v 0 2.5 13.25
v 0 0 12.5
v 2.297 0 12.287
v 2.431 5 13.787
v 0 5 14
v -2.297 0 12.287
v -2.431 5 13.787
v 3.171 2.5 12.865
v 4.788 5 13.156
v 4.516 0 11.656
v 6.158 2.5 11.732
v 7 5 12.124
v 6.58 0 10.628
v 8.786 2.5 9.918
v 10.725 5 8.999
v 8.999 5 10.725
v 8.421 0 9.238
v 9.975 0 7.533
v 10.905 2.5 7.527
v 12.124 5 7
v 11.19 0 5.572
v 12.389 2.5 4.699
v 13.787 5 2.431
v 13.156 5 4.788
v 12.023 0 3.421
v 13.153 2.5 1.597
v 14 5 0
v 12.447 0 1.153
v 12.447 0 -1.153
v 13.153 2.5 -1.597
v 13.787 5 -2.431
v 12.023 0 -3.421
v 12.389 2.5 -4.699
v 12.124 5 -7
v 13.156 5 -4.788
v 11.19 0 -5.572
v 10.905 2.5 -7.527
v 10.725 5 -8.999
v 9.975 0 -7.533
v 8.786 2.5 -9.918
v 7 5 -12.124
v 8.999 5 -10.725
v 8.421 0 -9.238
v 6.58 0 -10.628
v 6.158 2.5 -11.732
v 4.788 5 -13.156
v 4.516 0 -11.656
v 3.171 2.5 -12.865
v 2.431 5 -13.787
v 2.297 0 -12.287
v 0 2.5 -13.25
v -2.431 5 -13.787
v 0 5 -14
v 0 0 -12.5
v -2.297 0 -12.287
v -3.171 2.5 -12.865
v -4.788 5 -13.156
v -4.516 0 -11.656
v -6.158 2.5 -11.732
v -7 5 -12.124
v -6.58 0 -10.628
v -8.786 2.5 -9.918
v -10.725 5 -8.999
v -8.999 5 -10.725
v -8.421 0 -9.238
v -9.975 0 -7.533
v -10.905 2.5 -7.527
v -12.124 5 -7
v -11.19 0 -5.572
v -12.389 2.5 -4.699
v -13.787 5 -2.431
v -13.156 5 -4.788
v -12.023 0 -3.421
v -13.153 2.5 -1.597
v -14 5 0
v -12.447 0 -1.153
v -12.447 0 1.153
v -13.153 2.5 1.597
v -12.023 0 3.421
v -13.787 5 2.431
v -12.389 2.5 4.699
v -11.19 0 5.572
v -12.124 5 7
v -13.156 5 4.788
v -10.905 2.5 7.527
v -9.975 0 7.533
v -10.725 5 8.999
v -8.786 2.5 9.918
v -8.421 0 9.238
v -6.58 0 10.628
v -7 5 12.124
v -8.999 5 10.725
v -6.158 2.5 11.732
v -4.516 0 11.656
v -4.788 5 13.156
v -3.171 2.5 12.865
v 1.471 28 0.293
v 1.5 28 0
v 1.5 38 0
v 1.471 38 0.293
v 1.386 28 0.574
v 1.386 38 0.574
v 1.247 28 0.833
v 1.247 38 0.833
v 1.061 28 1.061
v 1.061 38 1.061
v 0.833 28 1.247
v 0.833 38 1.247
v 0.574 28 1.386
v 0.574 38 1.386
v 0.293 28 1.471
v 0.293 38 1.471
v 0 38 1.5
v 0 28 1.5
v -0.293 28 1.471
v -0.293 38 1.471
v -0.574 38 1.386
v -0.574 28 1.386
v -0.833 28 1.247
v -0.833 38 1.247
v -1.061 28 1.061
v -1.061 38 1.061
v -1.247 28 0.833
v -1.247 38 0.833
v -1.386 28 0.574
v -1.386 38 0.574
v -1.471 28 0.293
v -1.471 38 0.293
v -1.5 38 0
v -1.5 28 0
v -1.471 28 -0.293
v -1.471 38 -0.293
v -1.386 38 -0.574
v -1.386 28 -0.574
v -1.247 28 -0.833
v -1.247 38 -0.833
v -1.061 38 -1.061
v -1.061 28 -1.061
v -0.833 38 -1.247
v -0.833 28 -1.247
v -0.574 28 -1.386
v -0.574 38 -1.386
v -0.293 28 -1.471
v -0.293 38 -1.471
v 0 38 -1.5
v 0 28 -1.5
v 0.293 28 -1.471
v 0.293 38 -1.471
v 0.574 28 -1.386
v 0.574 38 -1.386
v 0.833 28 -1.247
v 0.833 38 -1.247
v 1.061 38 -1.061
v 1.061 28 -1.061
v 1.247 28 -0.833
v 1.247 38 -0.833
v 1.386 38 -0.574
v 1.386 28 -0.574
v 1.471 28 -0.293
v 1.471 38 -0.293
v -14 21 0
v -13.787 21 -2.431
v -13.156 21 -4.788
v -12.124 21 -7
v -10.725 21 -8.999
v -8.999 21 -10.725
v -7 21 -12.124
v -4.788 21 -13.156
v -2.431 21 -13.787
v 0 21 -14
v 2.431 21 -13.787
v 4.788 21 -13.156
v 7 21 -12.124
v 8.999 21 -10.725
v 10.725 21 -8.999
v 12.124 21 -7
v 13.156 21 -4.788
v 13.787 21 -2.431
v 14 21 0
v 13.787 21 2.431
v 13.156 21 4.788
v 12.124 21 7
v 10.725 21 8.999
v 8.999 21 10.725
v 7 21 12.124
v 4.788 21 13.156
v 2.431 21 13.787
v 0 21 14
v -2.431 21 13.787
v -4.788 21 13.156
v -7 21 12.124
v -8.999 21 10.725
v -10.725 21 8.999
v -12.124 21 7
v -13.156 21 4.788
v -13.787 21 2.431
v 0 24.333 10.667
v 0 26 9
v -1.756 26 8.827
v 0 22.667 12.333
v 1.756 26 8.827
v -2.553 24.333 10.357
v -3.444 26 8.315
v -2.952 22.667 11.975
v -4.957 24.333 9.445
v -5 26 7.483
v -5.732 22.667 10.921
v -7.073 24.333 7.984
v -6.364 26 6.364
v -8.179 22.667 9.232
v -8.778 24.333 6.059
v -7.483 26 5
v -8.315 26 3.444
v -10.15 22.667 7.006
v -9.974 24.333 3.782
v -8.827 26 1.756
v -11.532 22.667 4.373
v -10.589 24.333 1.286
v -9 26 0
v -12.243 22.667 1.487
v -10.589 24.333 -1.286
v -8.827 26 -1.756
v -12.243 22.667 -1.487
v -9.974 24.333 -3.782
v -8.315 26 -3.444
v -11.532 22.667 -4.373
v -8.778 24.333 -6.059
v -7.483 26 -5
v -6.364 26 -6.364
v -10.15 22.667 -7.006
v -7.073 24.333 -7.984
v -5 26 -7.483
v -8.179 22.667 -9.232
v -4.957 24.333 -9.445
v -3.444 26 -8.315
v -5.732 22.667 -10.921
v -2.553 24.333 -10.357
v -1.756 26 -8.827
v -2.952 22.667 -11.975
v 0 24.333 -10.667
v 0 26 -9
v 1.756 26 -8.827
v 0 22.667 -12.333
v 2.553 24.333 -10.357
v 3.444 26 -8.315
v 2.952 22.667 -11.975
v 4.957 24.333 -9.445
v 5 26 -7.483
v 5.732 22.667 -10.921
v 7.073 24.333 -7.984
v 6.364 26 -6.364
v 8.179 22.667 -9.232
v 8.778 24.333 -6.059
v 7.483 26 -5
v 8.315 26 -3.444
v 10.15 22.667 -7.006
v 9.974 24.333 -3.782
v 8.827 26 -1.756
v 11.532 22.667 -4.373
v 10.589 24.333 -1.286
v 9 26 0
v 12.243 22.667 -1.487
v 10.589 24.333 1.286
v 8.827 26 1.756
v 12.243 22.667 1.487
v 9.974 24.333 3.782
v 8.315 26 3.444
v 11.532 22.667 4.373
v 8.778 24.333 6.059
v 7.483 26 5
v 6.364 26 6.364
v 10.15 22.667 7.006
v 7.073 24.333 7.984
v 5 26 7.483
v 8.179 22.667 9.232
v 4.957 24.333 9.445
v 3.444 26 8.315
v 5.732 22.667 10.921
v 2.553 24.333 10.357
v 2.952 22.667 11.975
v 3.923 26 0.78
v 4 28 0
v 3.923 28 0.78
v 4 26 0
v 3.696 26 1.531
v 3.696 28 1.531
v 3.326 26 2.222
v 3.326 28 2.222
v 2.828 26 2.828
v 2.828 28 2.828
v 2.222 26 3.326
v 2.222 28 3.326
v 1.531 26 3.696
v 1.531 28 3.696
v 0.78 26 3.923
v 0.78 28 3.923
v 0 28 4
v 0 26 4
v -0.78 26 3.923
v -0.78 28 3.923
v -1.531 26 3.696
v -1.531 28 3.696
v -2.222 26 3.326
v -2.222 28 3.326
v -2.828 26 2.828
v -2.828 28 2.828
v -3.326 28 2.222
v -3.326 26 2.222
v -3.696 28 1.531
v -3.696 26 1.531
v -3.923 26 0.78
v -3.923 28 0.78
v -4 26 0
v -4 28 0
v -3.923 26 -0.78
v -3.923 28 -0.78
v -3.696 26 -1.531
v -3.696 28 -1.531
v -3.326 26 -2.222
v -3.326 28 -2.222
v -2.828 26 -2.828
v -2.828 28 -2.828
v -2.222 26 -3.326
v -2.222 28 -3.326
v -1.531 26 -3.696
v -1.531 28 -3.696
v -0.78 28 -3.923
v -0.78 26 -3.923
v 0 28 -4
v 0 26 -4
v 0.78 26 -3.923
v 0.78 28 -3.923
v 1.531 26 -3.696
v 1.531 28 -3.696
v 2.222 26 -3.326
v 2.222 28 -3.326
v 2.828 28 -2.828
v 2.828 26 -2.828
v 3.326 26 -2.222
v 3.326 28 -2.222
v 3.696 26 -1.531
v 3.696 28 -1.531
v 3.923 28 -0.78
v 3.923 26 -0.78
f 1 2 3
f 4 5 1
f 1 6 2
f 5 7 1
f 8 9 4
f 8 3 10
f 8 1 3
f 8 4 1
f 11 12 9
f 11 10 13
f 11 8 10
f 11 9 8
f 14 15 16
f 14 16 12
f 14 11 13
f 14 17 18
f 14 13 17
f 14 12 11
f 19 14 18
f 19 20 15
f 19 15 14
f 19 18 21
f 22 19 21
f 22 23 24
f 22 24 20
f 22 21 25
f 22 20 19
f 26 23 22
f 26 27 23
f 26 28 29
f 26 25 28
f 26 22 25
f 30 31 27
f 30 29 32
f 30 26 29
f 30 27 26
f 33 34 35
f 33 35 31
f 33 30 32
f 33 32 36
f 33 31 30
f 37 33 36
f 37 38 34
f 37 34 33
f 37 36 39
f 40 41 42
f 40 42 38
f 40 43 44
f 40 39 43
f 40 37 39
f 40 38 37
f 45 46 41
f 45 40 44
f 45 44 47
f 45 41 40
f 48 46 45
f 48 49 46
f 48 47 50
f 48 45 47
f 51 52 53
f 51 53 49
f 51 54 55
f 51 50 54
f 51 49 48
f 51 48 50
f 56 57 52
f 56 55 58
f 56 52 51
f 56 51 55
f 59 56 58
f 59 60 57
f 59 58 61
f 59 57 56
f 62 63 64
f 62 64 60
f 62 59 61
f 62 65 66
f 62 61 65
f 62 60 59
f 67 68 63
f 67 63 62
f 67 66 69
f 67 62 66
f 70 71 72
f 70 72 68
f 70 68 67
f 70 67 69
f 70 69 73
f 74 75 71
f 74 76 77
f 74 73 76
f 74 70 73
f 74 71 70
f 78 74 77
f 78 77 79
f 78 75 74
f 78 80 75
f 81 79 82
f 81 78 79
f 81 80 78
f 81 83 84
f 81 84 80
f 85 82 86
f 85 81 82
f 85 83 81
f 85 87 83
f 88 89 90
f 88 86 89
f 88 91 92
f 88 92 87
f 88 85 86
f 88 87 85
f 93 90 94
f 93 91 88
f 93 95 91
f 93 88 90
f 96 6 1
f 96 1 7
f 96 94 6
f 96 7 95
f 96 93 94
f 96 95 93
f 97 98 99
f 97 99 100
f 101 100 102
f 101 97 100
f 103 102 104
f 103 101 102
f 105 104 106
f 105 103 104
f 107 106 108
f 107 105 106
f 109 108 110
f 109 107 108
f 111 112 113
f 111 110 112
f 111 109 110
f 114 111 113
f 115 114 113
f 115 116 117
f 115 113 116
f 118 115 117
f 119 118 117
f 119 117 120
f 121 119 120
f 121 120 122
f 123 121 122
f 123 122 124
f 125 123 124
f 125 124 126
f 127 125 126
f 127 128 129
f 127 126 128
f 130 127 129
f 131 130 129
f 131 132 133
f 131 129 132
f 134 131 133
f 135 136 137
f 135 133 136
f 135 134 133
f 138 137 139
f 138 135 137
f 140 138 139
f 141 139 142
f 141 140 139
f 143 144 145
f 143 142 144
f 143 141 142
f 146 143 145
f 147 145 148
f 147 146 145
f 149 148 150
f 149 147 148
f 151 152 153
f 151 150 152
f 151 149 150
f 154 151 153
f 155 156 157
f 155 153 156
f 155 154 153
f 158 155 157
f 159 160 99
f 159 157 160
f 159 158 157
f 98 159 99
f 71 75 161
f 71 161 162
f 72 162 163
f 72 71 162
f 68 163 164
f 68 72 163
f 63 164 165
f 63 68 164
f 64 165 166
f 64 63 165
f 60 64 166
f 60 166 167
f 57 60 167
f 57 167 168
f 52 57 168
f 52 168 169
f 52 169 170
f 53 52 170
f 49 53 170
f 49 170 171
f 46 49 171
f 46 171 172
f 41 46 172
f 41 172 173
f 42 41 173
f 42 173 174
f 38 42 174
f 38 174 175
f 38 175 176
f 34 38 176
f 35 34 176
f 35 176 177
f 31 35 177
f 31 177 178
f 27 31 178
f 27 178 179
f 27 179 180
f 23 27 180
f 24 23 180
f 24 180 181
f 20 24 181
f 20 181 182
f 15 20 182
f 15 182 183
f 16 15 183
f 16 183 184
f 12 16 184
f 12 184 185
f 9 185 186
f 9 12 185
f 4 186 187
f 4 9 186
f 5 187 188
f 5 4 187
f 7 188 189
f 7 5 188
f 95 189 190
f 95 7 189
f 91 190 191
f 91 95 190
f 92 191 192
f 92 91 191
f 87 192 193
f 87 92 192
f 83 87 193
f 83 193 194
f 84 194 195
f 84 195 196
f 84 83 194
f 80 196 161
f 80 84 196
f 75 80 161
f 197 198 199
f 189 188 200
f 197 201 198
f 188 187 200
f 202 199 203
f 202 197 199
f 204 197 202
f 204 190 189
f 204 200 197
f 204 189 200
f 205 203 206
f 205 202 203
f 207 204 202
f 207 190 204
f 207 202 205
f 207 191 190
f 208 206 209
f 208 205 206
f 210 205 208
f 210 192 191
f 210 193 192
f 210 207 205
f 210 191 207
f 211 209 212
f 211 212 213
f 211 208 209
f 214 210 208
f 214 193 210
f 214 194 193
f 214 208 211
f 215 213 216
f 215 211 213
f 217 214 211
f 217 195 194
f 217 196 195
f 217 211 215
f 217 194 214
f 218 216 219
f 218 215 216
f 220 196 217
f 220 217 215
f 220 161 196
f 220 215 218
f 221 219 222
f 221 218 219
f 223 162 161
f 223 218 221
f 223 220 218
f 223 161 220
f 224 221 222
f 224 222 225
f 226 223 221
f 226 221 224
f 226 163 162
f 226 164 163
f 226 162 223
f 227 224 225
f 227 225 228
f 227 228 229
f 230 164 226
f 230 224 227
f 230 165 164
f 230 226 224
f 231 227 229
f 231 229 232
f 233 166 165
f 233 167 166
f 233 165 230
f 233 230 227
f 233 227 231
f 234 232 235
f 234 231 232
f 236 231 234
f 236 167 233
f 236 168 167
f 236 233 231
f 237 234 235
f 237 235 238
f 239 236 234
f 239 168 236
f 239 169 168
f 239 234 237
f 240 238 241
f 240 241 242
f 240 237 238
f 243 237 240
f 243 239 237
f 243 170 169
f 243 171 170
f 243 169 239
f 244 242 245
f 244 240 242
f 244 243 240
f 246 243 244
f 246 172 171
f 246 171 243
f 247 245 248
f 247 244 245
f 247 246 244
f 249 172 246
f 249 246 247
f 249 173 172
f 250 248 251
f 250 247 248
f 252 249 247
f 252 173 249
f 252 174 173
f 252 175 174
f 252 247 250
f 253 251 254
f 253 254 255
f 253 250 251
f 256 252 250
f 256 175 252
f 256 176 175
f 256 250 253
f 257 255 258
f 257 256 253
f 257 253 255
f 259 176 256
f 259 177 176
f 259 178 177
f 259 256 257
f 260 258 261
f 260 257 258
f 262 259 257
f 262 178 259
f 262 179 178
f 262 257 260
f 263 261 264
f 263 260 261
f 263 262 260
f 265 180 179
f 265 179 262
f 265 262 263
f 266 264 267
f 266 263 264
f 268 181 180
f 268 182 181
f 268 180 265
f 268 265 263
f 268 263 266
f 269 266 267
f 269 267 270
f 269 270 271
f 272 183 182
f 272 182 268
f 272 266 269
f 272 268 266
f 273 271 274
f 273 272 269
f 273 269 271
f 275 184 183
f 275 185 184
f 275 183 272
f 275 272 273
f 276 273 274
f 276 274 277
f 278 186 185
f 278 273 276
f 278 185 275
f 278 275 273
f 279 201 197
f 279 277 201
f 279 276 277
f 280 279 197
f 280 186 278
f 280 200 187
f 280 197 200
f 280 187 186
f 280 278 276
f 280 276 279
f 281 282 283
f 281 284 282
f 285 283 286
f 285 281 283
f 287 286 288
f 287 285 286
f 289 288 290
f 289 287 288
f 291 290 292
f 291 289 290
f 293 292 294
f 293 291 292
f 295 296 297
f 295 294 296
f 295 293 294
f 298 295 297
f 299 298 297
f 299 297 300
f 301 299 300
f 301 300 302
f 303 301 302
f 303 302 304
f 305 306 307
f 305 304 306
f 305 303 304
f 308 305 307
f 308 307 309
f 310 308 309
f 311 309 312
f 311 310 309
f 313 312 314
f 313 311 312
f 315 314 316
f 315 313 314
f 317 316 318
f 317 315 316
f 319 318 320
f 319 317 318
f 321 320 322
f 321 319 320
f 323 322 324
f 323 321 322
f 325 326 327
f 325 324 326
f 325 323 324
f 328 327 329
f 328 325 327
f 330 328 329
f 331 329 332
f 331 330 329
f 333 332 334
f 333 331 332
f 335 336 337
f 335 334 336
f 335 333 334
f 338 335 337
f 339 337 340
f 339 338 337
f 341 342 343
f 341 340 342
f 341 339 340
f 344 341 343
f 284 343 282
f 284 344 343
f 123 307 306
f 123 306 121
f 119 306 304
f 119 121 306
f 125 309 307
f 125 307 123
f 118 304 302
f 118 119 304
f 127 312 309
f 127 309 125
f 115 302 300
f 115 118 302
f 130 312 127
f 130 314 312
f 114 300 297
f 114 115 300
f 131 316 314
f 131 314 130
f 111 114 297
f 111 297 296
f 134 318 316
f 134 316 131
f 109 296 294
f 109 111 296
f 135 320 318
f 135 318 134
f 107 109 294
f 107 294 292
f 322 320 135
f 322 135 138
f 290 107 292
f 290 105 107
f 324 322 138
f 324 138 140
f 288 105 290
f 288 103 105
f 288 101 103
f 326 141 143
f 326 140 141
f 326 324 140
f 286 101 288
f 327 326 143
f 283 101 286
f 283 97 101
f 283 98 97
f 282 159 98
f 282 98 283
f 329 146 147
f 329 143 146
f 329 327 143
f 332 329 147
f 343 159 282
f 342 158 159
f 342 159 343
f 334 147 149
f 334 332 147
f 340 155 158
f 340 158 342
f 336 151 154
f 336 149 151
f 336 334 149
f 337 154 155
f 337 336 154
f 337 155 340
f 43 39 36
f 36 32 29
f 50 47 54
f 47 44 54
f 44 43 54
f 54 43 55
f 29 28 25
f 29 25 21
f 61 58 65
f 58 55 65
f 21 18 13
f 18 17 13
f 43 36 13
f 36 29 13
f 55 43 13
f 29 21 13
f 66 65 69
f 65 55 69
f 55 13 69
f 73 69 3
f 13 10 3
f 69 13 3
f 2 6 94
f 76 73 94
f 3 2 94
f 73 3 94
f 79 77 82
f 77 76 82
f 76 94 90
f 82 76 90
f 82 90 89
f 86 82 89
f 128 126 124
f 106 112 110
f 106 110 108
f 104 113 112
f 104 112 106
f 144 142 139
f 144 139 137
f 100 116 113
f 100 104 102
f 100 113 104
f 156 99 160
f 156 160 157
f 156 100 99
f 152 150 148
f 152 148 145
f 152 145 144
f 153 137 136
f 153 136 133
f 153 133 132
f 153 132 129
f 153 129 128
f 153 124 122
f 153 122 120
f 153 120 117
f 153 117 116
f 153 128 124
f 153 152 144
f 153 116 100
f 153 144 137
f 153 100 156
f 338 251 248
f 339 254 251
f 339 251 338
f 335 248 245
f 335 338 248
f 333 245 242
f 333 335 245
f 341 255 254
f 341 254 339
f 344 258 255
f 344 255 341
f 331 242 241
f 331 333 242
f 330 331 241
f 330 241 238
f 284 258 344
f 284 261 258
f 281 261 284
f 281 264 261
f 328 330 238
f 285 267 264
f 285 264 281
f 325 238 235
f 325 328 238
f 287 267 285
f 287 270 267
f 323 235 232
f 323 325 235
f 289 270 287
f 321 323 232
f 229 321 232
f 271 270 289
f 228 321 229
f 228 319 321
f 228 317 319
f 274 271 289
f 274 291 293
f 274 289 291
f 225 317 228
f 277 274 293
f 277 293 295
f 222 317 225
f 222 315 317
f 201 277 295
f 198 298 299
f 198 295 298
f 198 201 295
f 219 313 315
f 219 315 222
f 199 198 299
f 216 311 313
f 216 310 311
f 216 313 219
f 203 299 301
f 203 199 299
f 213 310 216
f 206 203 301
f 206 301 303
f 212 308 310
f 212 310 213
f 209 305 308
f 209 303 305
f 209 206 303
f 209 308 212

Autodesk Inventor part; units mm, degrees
ref_plane "YZ Plane" through (0, 0, 0) normal (1, 0, 0) x (0, 1, 0)
ref_plane "XZ Plane" through (0, 0, 0) normal (0, 1, 0) x (-1, 0, 0)
ref_plane "XY Plane" through (0, 0, 0) normal (0, 0, 1) x (1, 0, 0)
sketch "Boceto1" plane through (0, 0, 0) normal (0, 1, 0) x (-1, 0, 0)
  circle A0 centre (0, 0) radius 14
  dimension "d0" = 28
extrude "Extrusión1" add sketch "Boceto1" along normal blind 26
sketch "Boceto2" plane through (0, 26, 0) normal (0, 1, 0) x (1, 0, 0)
  circle A0 centre (0, 0) radius 4
  dimension "d3" = 8
extrude "Extrusión2" add sketch "Boceto2" along normal blind 2
sketch "Boceto3" plane through (0, 28, 0) normal (0, 1, 0) x (1, 0, 0)
  circle A0 centre (0, 0) radius 1.5
  dimension "d6" = 3
extrude "Extrusión3" add sketch "Boceto3" along normal blind 10
sketch "Boceto4" plane through (0, 0, 0) normal (1, 0, 0) x (0, 1, 0)
  line L0 (26, -14) -> (26, 14) projected
  line L1 (26, 14) -> (26, 9)
  line L2 (0, 14) -> (26, 14) projected
  line L3 (21, 14) -> (26, 9)
  line L4 (26, 14) -> (21, 14)
  line L5 (29.3126, 0) -> (24.3126, 0)
  line L6 (0, -14) -> (0, 14) projected
  line L7 (0, 14) -> (0, 12.5)
  line L8 (0, 14) -> (5, 14)
  line L9 (0, 14) -> (26, 14) projected
  line L10 (5, 14) -> (0, 12.5)
  point P0 (0, 0)
  dimension "d9" = 5
  dimension "d11" = 5
  dimension "d13" = 1.5
  dimension "d14" = 5
revolve "Revolución1" cut sketch "Boceto4" angle 360 about axis through (0, 29.3126, 0) along (0, -1, 0)
properties part number "Motor"
